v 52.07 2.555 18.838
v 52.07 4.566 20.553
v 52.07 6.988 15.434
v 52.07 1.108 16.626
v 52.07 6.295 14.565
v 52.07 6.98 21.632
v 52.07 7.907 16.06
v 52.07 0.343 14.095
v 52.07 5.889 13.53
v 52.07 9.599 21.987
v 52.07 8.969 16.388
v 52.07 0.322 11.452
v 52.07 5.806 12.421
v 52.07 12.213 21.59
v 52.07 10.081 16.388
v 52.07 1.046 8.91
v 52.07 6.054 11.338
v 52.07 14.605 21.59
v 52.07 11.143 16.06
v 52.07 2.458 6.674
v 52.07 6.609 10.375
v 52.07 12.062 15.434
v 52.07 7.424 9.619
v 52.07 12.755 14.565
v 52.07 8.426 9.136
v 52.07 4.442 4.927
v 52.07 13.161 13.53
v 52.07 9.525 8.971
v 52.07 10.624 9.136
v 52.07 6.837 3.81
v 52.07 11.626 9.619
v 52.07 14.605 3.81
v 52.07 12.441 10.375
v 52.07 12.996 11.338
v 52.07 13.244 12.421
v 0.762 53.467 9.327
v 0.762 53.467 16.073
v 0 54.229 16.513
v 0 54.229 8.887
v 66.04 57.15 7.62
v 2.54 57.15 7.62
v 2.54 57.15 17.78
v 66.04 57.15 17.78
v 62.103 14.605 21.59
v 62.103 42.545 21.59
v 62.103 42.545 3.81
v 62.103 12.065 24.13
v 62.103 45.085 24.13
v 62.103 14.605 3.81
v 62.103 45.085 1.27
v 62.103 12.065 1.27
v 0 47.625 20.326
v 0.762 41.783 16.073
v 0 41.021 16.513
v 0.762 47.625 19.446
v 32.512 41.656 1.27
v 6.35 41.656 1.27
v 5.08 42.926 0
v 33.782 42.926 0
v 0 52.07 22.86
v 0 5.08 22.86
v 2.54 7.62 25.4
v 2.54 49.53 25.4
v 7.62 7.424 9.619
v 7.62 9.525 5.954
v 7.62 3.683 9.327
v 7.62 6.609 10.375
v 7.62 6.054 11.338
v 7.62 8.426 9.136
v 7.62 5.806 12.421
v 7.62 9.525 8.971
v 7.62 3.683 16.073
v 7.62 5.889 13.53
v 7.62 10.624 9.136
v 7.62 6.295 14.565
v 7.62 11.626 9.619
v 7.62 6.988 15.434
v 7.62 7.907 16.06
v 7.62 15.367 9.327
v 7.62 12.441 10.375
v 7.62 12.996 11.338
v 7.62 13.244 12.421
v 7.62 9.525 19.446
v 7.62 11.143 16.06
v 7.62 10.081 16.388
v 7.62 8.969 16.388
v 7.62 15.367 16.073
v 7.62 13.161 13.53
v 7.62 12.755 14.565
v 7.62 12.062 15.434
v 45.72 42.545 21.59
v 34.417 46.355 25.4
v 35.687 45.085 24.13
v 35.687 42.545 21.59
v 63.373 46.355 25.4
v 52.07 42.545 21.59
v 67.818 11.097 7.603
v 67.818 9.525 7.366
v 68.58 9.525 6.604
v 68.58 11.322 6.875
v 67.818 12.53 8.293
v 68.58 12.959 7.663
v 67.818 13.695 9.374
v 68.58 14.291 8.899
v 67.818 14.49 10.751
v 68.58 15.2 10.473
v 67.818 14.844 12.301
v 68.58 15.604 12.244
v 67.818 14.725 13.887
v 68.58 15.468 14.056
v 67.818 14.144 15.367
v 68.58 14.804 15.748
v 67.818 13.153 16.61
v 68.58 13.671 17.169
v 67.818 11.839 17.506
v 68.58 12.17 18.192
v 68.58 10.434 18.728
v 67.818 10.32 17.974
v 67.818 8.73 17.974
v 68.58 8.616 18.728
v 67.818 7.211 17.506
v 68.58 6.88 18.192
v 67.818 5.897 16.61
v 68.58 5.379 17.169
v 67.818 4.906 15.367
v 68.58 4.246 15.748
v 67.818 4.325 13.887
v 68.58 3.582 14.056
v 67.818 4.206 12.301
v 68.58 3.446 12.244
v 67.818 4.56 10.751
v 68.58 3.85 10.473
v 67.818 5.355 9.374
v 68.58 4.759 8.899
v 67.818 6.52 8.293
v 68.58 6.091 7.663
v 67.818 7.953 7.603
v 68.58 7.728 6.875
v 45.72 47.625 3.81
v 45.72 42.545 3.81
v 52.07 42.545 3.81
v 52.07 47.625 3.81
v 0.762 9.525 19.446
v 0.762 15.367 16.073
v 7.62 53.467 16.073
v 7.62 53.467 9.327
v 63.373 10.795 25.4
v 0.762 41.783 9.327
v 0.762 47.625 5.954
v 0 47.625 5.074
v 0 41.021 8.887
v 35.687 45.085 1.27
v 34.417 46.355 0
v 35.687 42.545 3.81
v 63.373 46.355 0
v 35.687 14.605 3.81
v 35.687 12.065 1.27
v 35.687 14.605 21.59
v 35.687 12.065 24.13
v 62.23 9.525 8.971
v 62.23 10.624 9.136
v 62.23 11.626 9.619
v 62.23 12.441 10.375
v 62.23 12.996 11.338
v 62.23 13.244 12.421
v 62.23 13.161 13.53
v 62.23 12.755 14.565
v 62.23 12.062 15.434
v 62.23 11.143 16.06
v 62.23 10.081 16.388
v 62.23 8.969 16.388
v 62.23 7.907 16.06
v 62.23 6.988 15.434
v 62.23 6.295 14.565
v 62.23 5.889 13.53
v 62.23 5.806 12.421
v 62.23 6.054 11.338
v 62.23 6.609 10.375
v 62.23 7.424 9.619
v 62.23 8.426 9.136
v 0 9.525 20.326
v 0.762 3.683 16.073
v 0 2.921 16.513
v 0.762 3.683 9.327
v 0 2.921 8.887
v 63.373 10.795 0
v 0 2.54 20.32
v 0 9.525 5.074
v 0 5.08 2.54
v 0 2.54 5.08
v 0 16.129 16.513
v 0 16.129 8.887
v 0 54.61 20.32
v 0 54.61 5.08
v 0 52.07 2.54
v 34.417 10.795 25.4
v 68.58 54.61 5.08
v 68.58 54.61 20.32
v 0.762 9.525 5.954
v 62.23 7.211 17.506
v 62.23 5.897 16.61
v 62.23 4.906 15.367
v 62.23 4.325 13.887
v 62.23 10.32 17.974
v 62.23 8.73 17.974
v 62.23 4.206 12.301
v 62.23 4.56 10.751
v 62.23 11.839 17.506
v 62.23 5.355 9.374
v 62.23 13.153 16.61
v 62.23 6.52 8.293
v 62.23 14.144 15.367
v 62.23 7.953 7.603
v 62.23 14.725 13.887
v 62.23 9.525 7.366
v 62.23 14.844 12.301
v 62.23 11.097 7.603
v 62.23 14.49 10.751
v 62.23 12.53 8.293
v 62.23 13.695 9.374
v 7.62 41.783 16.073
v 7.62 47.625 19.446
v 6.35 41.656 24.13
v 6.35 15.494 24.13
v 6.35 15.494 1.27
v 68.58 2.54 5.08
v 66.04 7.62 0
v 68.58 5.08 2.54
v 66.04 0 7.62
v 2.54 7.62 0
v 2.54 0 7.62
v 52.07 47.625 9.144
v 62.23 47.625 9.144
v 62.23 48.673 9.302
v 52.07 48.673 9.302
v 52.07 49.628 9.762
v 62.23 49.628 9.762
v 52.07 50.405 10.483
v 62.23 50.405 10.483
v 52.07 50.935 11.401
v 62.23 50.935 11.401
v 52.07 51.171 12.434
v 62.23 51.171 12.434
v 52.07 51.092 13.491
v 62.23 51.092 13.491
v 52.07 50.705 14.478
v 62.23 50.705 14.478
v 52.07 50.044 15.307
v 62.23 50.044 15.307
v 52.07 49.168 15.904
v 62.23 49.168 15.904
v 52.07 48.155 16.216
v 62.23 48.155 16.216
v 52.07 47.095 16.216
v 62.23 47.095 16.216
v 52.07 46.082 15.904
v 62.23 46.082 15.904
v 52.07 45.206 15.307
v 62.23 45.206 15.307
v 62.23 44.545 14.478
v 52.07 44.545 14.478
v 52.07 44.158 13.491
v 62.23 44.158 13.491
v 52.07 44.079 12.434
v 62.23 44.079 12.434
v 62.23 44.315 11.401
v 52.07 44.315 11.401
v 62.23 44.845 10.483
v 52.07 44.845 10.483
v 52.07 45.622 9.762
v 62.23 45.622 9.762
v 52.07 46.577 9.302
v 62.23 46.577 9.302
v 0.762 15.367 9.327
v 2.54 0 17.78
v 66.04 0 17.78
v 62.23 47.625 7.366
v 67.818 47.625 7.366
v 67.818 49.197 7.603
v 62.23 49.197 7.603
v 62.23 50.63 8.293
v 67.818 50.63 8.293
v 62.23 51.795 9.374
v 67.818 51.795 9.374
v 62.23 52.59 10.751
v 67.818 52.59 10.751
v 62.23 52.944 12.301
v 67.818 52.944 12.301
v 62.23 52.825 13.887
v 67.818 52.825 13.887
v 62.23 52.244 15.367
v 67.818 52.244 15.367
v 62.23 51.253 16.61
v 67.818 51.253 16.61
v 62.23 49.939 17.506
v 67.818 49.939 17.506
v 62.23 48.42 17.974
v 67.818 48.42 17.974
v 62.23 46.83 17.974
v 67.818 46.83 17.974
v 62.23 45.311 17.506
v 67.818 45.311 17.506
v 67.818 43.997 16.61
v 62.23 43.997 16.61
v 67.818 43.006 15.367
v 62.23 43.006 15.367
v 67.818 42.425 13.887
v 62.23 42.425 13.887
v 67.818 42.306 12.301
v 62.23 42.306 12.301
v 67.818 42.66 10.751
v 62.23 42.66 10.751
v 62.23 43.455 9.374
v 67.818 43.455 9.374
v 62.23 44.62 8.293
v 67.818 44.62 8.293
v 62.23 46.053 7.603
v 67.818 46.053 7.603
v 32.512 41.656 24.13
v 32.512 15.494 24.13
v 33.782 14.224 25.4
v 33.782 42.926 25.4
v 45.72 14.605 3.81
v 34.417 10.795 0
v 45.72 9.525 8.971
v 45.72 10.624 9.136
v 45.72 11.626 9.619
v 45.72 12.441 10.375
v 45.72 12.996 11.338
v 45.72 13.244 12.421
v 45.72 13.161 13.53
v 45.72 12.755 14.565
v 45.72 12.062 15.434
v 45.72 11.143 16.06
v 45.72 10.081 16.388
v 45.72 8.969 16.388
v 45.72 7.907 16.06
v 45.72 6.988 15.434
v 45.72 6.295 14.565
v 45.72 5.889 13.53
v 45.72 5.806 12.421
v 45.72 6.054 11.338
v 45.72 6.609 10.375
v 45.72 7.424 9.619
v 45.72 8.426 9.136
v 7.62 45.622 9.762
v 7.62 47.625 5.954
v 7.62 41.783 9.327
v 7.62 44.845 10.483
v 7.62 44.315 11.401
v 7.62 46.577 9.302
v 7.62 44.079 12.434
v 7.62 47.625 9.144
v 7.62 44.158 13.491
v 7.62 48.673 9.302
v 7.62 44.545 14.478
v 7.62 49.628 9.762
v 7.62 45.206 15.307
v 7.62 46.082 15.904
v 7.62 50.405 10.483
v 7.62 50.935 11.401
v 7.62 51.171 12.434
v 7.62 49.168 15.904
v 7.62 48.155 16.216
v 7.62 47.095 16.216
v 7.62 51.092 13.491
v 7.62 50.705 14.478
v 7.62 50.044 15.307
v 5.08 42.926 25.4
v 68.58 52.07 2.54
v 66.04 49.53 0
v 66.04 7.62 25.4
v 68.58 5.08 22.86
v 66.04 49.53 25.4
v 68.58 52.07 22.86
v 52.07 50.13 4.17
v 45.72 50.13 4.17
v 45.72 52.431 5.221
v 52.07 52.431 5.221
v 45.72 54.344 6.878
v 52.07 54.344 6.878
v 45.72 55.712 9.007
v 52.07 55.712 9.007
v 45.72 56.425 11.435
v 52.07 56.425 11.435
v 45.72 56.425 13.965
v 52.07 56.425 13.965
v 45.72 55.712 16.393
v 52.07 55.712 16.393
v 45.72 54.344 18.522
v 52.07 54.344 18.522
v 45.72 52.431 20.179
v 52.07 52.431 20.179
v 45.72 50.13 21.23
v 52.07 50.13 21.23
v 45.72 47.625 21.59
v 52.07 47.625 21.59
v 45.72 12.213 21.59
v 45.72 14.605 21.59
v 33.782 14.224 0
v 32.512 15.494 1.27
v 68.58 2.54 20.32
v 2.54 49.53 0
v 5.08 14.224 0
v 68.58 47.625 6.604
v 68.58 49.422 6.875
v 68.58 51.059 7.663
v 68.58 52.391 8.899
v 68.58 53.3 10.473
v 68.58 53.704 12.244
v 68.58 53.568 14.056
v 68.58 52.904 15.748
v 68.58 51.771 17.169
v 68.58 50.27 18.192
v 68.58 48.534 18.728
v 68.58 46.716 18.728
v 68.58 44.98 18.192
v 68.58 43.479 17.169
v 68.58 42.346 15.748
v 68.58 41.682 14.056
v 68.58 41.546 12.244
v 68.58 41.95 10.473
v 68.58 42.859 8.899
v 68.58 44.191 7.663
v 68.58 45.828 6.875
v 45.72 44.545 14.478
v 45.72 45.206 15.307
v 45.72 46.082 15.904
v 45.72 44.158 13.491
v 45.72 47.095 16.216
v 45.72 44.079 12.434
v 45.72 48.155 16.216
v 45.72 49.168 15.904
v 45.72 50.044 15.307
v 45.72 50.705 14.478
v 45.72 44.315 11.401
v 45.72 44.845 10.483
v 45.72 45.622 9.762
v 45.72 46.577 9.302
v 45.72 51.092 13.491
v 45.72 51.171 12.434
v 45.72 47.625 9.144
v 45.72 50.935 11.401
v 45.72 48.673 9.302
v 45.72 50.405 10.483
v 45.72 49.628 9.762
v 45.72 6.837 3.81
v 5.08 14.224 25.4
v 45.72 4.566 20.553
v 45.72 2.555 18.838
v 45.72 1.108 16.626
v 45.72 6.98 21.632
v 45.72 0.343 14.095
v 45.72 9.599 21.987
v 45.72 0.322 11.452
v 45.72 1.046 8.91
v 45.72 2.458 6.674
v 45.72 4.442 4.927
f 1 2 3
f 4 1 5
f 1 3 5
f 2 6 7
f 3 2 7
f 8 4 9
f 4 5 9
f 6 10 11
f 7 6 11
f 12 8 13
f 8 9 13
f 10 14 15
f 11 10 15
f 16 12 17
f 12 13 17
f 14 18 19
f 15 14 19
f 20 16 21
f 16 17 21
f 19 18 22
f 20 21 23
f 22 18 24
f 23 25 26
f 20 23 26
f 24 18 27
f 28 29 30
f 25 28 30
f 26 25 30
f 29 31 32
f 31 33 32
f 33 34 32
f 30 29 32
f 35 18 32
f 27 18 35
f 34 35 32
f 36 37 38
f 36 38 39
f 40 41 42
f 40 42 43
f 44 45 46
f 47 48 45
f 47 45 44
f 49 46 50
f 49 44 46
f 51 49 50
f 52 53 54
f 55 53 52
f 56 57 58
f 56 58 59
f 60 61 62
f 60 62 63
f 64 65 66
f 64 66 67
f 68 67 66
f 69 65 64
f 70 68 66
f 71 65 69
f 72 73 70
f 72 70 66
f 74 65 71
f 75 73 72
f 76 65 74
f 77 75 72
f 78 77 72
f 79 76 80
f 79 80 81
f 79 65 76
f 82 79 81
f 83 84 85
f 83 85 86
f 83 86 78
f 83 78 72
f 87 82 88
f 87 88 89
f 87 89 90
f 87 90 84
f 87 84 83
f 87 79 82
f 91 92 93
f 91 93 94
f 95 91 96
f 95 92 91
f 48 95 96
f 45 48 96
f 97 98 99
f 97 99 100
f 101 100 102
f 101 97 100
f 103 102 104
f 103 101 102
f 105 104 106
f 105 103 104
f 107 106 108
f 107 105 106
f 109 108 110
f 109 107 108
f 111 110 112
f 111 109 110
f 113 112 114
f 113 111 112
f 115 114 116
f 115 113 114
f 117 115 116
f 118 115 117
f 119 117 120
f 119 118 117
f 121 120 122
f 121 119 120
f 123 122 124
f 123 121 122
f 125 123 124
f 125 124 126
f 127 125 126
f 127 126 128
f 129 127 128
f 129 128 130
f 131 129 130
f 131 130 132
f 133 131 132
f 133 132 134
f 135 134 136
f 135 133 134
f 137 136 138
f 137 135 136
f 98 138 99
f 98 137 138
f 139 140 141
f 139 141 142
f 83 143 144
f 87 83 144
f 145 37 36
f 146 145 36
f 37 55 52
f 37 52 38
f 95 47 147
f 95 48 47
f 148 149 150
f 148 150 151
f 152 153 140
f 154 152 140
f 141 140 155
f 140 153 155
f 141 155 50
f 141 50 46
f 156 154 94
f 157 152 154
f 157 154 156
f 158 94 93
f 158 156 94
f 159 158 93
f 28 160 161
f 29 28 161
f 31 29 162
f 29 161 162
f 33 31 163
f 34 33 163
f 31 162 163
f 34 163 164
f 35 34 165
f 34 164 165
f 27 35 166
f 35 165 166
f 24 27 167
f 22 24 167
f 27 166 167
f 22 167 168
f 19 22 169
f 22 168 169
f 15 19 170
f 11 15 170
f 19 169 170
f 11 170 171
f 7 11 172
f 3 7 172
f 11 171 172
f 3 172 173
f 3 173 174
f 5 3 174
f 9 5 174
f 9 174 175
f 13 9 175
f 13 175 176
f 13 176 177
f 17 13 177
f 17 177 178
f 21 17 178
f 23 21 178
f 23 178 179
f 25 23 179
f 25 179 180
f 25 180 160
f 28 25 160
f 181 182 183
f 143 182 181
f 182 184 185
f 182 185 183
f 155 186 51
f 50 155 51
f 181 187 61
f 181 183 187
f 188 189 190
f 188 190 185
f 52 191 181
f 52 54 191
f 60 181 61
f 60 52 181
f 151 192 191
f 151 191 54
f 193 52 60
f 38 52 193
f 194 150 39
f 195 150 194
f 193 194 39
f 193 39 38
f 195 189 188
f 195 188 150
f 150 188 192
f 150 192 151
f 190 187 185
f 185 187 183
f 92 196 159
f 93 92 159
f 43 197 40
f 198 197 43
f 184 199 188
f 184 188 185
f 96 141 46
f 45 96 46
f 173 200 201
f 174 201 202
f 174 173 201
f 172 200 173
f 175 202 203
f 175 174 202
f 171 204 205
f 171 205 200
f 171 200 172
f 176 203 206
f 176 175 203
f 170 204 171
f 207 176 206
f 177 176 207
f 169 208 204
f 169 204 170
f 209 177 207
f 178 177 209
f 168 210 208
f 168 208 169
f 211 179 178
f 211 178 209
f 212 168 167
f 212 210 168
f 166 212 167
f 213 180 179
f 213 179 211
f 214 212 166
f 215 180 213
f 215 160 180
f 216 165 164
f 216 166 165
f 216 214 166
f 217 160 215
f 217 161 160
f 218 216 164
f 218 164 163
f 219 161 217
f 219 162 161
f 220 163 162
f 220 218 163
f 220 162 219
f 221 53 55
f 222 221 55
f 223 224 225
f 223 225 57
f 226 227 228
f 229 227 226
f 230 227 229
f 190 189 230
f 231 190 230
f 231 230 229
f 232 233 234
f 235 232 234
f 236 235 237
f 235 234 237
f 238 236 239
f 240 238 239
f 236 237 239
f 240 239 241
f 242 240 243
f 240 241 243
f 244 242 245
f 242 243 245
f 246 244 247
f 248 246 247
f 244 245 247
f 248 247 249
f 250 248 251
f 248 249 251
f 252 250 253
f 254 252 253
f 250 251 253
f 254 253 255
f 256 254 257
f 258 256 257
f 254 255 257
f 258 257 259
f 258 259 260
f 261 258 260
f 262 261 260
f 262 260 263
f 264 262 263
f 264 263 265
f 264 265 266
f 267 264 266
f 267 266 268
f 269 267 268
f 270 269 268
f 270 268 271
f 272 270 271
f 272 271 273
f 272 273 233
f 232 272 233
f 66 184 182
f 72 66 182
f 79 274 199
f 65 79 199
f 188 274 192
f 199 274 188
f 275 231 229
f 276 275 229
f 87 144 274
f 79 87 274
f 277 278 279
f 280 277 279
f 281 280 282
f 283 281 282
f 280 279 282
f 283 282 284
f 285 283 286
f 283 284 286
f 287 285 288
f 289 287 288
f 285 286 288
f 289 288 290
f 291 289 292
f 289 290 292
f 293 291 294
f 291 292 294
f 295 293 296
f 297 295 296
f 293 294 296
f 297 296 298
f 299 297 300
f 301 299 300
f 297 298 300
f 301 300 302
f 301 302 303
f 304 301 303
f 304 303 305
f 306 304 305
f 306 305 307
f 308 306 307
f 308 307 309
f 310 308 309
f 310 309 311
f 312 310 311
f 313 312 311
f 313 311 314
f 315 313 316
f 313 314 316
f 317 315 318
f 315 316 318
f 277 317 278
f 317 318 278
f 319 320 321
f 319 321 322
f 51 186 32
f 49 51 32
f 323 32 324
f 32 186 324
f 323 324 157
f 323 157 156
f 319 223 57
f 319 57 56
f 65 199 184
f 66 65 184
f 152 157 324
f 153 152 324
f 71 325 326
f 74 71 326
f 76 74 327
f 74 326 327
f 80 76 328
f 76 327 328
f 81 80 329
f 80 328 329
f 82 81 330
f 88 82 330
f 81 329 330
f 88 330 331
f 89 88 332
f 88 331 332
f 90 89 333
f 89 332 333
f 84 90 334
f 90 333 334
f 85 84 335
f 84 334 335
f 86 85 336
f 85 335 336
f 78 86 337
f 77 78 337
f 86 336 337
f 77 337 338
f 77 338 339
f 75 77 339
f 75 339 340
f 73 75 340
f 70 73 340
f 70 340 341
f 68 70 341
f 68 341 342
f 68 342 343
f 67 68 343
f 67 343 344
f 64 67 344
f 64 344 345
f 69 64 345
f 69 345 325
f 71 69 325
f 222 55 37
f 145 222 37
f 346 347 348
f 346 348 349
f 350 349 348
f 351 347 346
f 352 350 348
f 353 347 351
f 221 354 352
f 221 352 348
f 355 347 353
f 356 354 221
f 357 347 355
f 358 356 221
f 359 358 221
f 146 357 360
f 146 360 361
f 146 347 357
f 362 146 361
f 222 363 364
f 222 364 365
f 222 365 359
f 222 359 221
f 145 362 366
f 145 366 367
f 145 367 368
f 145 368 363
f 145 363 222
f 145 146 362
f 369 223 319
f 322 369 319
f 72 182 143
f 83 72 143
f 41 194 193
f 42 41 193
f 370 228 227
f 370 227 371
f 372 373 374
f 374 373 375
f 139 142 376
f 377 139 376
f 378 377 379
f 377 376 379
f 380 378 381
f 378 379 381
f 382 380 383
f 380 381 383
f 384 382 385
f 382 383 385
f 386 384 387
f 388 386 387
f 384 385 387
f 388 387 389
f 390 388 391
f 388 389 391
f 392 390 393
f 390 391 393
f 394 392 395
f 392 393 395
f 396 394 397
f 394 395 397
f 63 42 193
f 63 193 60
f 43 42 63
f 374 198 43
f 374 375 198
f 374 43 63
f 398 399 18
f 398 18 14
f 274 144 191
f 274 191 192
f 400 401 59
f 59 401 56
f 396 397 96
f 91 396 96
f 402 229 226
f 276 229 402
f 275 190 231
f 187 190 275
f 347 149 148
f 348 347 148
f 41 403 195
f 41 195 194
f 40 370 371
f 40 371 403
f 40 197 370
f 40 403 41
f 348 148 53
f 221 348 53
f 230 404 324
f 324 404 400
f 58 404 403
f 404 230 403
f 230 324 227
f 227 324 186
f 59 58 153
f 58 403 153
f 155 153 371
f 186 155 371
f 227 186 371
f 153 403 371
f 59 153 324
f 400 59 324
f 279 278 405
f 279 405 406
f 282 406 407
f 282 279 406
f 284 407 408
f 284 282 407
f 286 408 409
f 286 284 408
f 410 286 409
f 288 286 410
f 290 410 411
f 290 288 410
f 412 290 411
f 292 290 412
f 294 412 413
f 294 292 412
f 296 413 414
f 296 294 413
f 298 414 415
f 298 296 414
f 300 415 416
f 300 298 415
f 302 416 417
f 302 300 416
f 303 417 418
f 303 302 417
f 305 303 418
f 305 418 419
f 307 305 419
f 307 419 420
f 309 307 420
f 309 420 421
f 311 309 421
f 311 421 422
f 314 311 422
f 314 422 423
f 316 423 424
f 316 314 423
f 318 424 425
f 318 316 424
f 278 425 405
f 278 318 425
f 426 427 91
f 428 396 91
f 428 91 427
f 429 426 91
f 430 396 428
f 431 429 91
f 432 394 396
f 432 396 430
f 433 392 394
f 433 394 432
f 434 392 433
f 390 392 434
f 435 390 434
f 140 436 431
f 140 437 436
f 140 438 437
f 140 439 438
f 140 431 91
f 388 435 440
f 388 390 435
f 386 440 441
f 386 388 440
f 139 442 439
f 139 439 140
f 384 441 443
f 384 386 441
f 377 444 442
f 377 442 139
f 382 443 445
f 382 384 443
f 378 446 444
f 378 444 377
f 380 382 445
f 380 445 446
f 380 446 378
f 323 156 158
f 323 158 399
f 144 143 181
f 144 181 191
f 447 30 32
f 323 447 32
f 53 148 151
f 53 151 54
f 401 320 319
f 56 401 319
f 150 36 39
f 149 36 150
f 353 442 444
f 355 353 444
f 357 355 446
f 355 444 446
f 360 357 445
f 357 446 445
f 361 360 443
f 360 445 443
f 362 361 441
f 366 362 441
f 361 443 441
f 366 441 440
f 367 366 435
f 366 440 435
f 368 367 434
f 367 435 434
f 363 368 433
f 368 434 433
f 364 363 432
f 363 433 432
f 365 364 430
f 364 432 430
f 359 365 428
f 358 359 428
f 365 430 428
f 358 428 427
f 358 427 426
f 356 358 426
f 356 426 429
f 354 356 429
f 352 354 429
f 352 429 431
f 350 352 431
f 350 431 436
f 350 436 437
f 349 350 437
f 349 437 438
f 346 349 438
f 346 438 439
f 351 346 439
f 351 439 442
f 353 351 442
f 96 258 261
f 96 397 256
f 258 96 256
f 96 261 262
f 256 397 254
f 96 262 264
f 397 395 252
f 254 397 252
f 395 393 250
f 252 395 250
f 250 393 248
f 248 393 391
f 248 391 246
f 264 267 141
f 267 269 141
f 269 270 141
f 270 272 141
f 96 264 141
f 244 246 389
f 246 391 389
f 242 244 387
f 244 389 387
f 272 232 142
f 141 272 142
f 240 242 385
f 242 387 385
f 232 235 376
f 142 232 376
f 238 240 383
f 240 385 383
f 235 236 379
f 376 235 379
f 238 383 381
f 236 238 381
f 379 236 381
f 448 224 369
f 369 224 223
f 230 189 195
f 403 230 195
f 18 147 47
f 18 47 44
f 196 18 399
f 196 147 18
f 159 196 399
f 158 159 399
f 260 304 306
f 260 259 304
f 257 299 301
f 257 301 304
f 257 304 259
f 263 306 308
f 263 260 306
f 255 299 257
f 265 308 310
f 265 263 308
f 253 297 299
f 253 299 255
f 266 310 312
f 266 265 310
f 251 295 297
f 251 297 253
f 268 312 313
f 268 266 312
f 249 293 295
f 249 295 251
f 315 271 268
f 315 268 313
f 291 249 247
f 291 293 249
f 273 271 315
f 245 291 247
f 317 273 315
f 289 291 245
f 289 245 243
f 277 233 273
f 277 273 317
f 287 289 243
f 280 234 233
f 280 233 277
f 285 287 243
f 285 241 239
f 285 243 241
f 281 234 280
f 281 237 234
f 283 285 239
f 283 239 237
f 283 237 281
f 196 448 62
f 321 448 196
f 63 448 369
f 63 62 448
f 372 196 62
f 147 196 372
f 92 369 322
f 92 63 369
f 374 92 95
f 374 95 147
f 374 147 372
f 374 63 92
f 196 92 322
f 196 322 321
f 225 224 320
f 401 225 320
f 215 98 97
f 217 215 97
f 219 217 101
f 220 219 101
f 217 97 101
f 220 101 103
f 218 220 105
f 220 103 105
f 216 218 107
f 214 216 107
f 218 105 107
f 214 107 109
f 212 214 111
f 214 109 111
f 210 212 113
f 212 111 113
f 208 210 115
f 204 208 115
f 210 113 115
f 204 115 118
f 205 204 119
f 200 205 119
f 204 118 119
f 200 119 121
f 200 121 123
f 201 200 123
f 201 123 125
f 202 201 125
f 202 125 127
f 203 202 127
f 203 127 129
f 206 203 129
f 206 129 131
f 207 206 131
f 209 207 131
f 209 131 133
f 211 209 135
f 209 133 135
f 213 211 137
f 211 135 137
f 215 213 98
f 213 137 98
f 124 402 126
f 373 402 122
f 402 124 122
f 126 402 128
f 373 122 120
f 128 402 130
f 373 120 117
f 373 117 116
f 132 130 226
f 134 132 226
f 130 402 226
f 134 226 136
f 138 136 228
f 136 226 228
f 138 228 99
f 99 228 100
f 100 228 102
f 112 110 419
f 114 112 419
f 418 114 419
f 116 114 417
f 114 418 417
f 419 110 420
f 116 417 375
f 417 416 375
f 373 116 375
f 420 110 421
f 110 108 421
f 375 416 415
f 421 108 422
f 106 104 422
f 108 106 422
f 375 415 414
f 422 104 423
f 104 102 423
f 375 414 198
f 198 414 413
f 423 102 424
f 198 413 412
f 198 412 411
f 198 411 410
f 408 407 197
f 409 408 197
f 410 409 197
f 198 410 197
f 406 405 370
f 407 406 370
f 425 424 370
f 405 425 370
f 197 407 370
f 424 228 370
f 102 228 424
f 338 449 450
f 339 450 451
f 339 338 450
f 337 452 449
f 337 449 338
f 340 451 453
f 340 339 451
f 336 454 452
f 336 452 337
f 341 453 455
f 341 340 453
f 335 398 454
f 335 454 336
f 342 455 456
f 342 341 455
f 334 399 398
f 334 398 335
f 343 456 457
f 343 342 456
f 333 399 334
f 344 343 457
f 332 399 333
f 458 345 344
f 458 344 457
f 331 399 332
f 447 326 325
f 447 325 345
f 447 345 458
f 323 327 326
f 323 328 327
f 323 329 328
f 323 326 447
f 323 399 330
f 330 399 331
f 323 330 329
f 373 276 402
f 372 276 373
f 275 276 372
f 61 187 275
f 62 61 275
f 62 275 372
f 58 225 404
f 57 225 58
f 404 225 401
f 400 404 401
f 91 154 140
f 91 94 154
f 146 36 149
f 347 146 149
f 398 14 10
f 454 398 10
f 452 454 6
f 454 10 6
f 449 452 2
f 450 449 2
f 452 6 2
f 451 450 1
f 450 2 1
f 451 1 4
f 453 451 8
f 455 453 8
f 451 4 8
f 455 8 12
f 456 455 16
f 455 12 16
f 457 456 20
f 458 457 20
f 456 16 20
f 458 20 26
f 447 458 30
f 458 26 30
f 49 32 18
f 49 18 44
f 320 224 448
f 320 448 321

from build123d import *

# Parameters (mm, degrees)
SKETCH1_W           = 68.58
SKETCH1_H           = 57.15
BOSS_EXTRUDE1_DEPTH = 25.4
SKETCH2_W           = 26.162
SKETCH2_H           = 26.162
SKETCH2_W_2         = 26.416
SKETCH2_H_2         = 27.94
CUT_EXTRUDE1_DEPTH  = 93.814324864
SKETCH5_R           = 3.556
SKETCH5_R_2         = 3.729278609
CUT_EXTRUDE2_DEPTH  = 93.814324864
CUT_EXTRUDE3_START  = -16.51
CUT_EXTRUDE3_DEPTH  = 6.35
CHAMFER1_SIZE       = 1.27
CHAMFER2_SIZE       = 2.54
CHAMFER3_SIZE       = 7.62
SKETCH7_R           = 5.334
CUT_EXTRUDE4_DEPTH  = 6.35
CUT_EXTRUDE5_DEPTH  = 7.62
CHAMFER4_SIZE       = 0.762
CHAMFER5_SIZE       = 3.81


with BuildPart() as part:
    # Sketch1 → Boss-Extrude1 (new body)
    with BuildSketch(Plane.XY):
        with Locations((34.29, 28.575)):
            Rectangle(SKETCH1_W, SKETCH1_H)
    extrude(amount=BOSS_EXTRUDE1_DEPTH)

    # Sketch2 → Cut-Extrude1 (cut, through all)
    with BuildSketch(Plane.XY.offset(25.4)):
        with Locations((19.431, 28.575)):
            Rectangle(SKETCH2_W, SKETCH2_H)
        with Locations((48.895, 28.575)):
            Rectangle(SKETCH2_W_2, SKETCH2_H_2)
    extrude(amount=-CUT_EXTRUDE1_DEPTH, mode=Mode.SUBTRACT)

    # Sketch5 → Cut-Extrude2 (cut, through all)
    with BuildSketch(Plane(origin=(68.58, 0, 0), x_dir=(0, 0, -1), z_dir=(1, 0, 0))):
        with Locations((-12.7, 47.625)):
            Circle(SKETCH5_R)
        with Locations((-12.7, 9.525)):
            Circle(SKETCH5_R_2)
    extrude(amount=-CUT_EXTRUDE2_DEPTH, mode=Mode.SUBTRACT)

    # Sketch6 → Cut-Extrude3 (cut)
    with BuildSketch(Plane(origin=(68.58, 0, 0), x_dir=(0, 0, -1), z_dir=(1, 0, 0)).offset(CUT_EXTRUDE3_START)):
        with BuildLine():
            Line((-21.59, 47.625), (-21.59, 12.21272508))
            ThreePointArc((-21.59, 12.21272508), (-15.38772508, 0.635), (-3.81, 6.83727492))
            Line((-3.81, 6.83727492), (-3.81, 47.625))
            ThreePointArc((-3.81, 47.625), (-12.7, 56.515), (-21.59, 47.625))
        make_face()
    extrude(amount=-CUT_EXTRUDE3_DEPTH, mode=Mode.SUBTRACT)

    # Chamfer1
    chamfer1_edges = [part.edges().sort_by_distance(p)[0] for p in [
        (6.35, 28.575, 0),
        (19.431, 41.656, 0),
        (32.512, 28.575, 0),
        (19.431, 15.494, 0),
        (6.35, 28.575, 25.4),
        (19.431, 15.494, 25.4),
        (32.512, 28.575, 25.4),
        (19.431, 41.656, 25.4),
        (35.687, 28.575, 0),
        (62.103, 28.575, 0),
        (35.687, 28.575, 25.4),
        (62.103, 28.575, 25.4),
    ]]
    chamfer(chamfer1_edges, length=CHAMFER1_SIZE)

    # Chamfer2
    chamfer2_edges = [part.edges().sort_by_distance(p)[0] for p in [
        (68.58, 28.575, 25.4),
        (0, 28.575, 25.4),
        (68.58, 28.575, 0),
        (0, 28.575, 0),
        (0, 57.15, 12.7),
        (68.58, 57.15, 12.7),
        (68.58, 0, 12.7),
        (0, 0, 12.7),
    ]]
    chamfer(chamfer2_edges, length=CHAMFER2_SIZE)

    # Chamfer3
    # the kernel refuses this chamfer: 7.62 mm, written as the material it takes off along each edge
    with BuildSketch(Plane(origin=(-17.056224368, 0, 0), x_dir=(0, 1, 0), z_dir=(1, 0, 0)), Plane(origin=(-17.056224368, 0, 25.4), x_dir=(0, 0, -1), z_dir=(1, 0, 0)), Plane(origin=(85.636224368, 57.15, 0), x_dir=(0, -1, 0), z_dir=(-1, 0, 0)), Plane(origin=(85.636224368, 57.15, 25.4), x_dir=(0, 0, -1), z_dir=(-1, 0, 0))) as chamfer3_piece_1:
        Polygon((CHAMFER3_SIZE, 0), (0, CHAMFER3_SIZE), (0, 0), align=None)
    extrude(amount=102.692448737, mode=Mode.SUBTRACT)

    # Sketch7 → Cut-Extrude4 (cut)
    with BuildSketch(Plane(origin=(68.58, 0, 0), x_dir=(0, 0, -1), z_dir=(1, 0, 0))):
        with Locations((-12.7, 47.625)):
            Circle(SKETCH7_R)
        with Locations((-12.7, 9.525)):
            Circle(SKETCH7_R)
    extrude(amount=-CUT_EXTRUDE4_DEPTH, mode=Mode.SUBTRACT)

    # Sketch9 → Cut-Extrude5 (cut)
    with BuildSketch(Plane.ZY):
        Polygon((16.072880273, 53.467), (9.327119727, 53.467), (5.954239455, 47.625), (9.327119727, 41.783), (16.072880273, 41.783), (19.445760545, 47.625), align=None)
        Polygon((16.072880273, 15.367), (9.327119727, 15.367), (5.954239455, 9.525), (9.327119727, 3.683), (16.072880273, 3.683), (19.445760545, 9.525), align=None)
    extrude(amount=-CUT_EXTRUDE5_DEPTH, mode=Mode.SUBTRACT)

    # Chamfer4
    chamfer4_edges = [part.edges().sort_by_distance(p)[0] for p in [
        (68.58, 47.625, 18.034),
        (68.58, 9.525, 18.034),
        (0, 50.546, 17.759320409),
        (0, 53.467, 12.7),
        (0, 50.546, 7.640679591),
        (0, 44.704, 7.640679591),
        (0, 41.783, 12.7),
        (0, 44.704, 17.759320409),
        (0, 12.446, 17.759320409),
        (0, 15.367, 12.7),
        (0, 12.446, 7.640679591),
        (0, 6.604, 7.640679591),
        (0, 3.683, 12.7),
        (0, 6.604, 17.759320409),
    ]]
    chamfer(chamfer4_edges, length=CHAMFER4_SIZE)

    # Chamfer5
    # the kernel refuses this chamfer: 3.81 mm, written as the material it takes off along each edge
    with BuildSketch(Plane(origin=(24.618887816, 14.605, 0), x_dir=(0, -1, 0), z_dir=(1, 0, 0))) as chamfer5_piece_1_section:
        Polygon((CHAMFER5_SIZE, 0), (0, -CHAMFER5_SIZE), (0, 0), align=None)
    chamfer5_piece_1 = extrude(amount=48.552224368, mode=Mode.PRIVATE)
    chamfer5_piece_1 = split(chamfer5_piece_1, bisect_by=Plane(origin=(29.517943908, 14.605, -4.899056092), z_dir=(-0.7071067811865467, 0, 0.7071067811865483)), keep=Keep.TOP, mode=Mode.PRIVATE)
    chamfer5_piece_1 = split(chamfer5_piece_1, bisect_by=Plane(origin=(35.687, 14.605, 0), z_dir=(1, 0, 0)), keep=Keep.TOP, mode=Mode.PRIVATE)
    add(chamfer5_piece_1, mode=Mode.SUBTRACT)
    with BuildSketch(Plane(origin=(24.618887816, 14.605, 0), x_dir=(0, -1, 0), z_dir=(1, 0, 0))) as chamfer5_piece_2_section:
        Polygon((CHAMFER5_SIZE, 0), (0, -CHAMFER5_SIZE), (0, 0), align=None)
    chamfer5_piece_2 = extrude(amount=48.552224368, mode=Mode.PRIVATE)
    chamfer5_piece_2 = split(chamfer5_piece_2, bisect_by=Plane(origin=(29.517943908, 14.605, -4.899056092), z_dir=(0.7071067811865467, 0, -0.7071067811865483)), keep=Keep.TOP, mode=Mode.PRIVATE)
    chamfer5_piece_2 = split(chamfer5_piece_2, bisect_by=Plane(origin=(35.687, 14.605, 0), z_dir=(-1, 0, 0)), keep=Keep.TOP, mode=Mode.PRIVATE)
    add(chamfer5_piece_2, mode=Mode.SUBTRACT)
    with BuildSketch(Plane(origin=(24.618887816, 14.605, 0), x_dir=(0, -1, 0), z_dir=(1, 0, 0))) as chamfer5_piece_3_section:
        Polygon((CHAMFER5_SIZE, 0), (0, -CHAMFER5_SIZE), (0, 0), align=None)
    chamfer5_piece_3 = extrude(amount=48.552224368, mode=Mode.PRIVATE)
    chamfer5_piece_3 = split(chamfer5_piece_3, bisect_by=Plane(origin=(62.103, 14.605, 0), z_dir=(-1, 0, 0)), keep=Keep.TOP, mode=Mode.PRIVATE)
    chamfer5_piece_3 = split(chamfer5_piece_3, bisect_by=Plane(origin=(43.995943908, 14.605, 19.377056092), z_dir=(-0.7071067811865467, 0, -0.7071067811865483)), keep=Keep.TOP, mode=Mode.PRIVATE)
    chamfer5_piece_3 = split(chamfer5_piece_3, bisect_by=Plane(origin=(29.517943908, 14.605, -4.899056092), z_dir=(0.7071067811865467, 0, -0.7071067811865483)), keep=Keep.TOP, mode=Mode.PRIVATE)
    chamfer5_piece_3 = split(chamfer5_piece_3, bisect_by=Plane(origin=(35.687, 14.605, 0), z_dir=(1, 0, 0)), keep=Keep.TOP, mode=Mode.PRIVATE)
    add(chamfer5_piece_3, mode=Mode.SUBTRACT)
    with BuildSketch(Plane(origin=(24.618887816, 14.605, 0), x_dir=(0, -1, 0), z_dir=(1, 0, 0))) as chamfer5_piece_4_section:
        Polygon((CHAMFER5_SIZE, 0), (0, -CHAMFER5_SIZE), (0, 0), align=None)
    chamfer5_piece_4 = extrude(amount=48.552224368, mode=Mode.PRIVATE)
    chamfer5_piece_4 = split(chamfer5_piece_4, bisect_by=Plane(origin=(62.103, 14.605, 0), z_dir=(-1, 0, 0)), keep=Keep.TOP, mode=Mode.PRIVATE)
    chamfer5_piece_4 = split(chamfer5_piece_4, bisect_by=Plane(origin=(43.995943908, 14.605, 19.377056092), z_dir=(0.7071067811865467, 0, 0.7071067811865483)), keep=Keep.TOP, mode=Mode.PRIVATE)
    add(chamfer5_piece_4, mode=Mode.SUBTRACT)
    with BuildSketch(Plane(origin=(24.618887816, 14.605, 0), x_dir=(0, -1, 0), z_dir=(1, 0, 0))) as chamfer5_piece_5_section:
        Polygon((CHAMFER5_SIZE, 0), (0, -CHAMFER5_SIZE), (0, 0), align=None)
    chamfer5_piece_5 = extrude(amount=48.552224368, mode=Mode.PRIVATE)
    chamfer5_piece_5 = split(chamfer5_piece_5, bisect_by=Plane(origin=(62.103, 14.605, 0), z_dir=(1, 0, 0)), keep=Keep.TOP, mode=Mode.PRIVATE)
    chamfer5_piece_5 = split(chamfer5_piece_5, bisect_by=Plane(origin=(43.995943908, 14.605, 19.377056092), z_dir=(-0.7071067811865467, 0, -0.7071067811865483)), keep=Keep.TOP, mode=Mode.PRIVATE)
    add(chamfer5_piece_5, mode=Mode.SUBTRACT)
    with BuildSketch(Plane(origin=(73.171112184, 42.545, 0), x_dir=(0, 1, 0), z_dir=(-1, 0, 0))) as chamfer5_piece_6_section:
        Polygon((CHAMFER5_SIZE, 0), (0, -CHAMFER5_SIZE), (0, 0), align=None)
    chamfer5_piece_6 = extrude(amount=48.552224368, mode=Mode.PRIVATE)
    chamfer5_piece_6 = split(chamfer5_piece_6, bisect_by=Plane(origin=(68.272056092, 42.545, -4.899056092), z_dir=(0.7071067811865467, 0, 0.7071067811865483)), keep=Keep.TOP, mode=Mode.PRIVATE)
    chamfer5_piece_6 = split(chamfer5_piece_6, bisect_by=Plane(origin=(62.103, 42.545, 0), z_dir=(-1, 0, 0)), keep=Keep.TOP, mode=Mode.PRIVATE)
    add(chamfer5_piece_6, mode=Mode.SUBTRACT)
    with BuildSketch(Plane(origin=(73.171112184, 42.545, 0), x_dir=(0, 1, 0), z_dir=(-1, 0, 0))) as chamfer5_piece_7_section:
        Polygon((CHAMFER5_SIZE, 0), (0, -CHAMFER5_SIZE), (0, 0), align=None)
    chamfer5_piece_7 = extrude(amount=48.552224368, mode=Mode.PRIVATE)
    chamfer5_piece_7 = split(chamfer5_piece_7, bisect_by=Plane(origin=(68.272056092, 42.545, -4.899056092), z_dir=(-0.7071067811865467, 0, -0.7071067811865483)), keep=Keep.TOP, mode=Mode.PRIVATE)
    chamfer5_piece_7 = split(chamfer5_piece_7, bisect_by=Plane(origin=(62.103, 42.545, 0), z_dir=(1, 0, 0)), keep=Keep.TOP, mode=Mode.PRIVATE)
    add(chamfer5_piece_7, mode=Mode.SUBTRACT)
    with BuildSketch(Plane(origin=(73.171112184, 42.545, 0), x_dir=(0, 1, 0), z_dir=(-1, 0, 0))) as chamfer5_piece_8_section:
        Polygon((CHAMFER5_SIZE, 0), (0, -CHAMFER5_SIZE), (0, 0), align=None)
    chamfer5_piece_8 = extrude(amount=48.552224368, mode=Mode.PRIVATE)
    chamfer5_piece_8 = split(chamfer5_piece_8, bisect_by=Plane(origin=(35.687, 42.545, 0), z_dir=(1, 0, 0)), keep=Keep.TOP, mode=Mode.PRIVATE)
    chamfer5_piece_8 = split(chamfer5_piece_8, bisect_by=Plane(origin=(53.794056092, 42.545, 19.377056092), z_dir=(0.7071067811865467, 0, -0.7071067811865483)), keep=Keep.TOP, mode=Mode.PRIVATE)
    chamfer5_piece_8 = split(chamfer5_piece_8, bisect_by=Plane(origin=(68.272056092, 42.545, -4.899056092), z_dir=(-0.7071067811865467, 0, -0.7071067811865483)), keep=Keep.TOP, mode=Mode.PRIVATE)
    chamfer5_piece_8 = split(chamfer5_piece_8, bisect_by=Plane(origin=(62.103, 42.545, 0), z_dir=(-1, 0, 0)), keep=Keep.TOP, mode=Mode.PRIVATE)
    add(chamfer5_piece_8, mode=Mode.SUBTRACT)
    with BuildSketch(Plane(origin=(73.171112184, 42.545, 0), x_dir=(0, 1, 0), z_dir=(-1, 0, 0))) as chamfer5_piece_9_section:
        Polygon((CHAMFER5_SIZE, 0), (0, -CHAMFER5_SIZE), (0, 0), align=None)
    chamfer5_piece_9 = extrude(amount=48.552224368, mode=Mode.PRIVATE)
    chamfer5_piece_9 = split(chamfer5_piece_9, bisect_by=Plane(origin=(35.687, 42.545, 0), z_dir=(1, 0, 0)), keep=Keep.TOP, mode=Mode.PRIVATE)
    chamfer5_piece_9 = split(chamfer5_piece_9, bisect_by=Plane(origin=(53.794056092, 42.545, 19.377056092), z_dir=(-0.7071067811865467, 0, 0.7071067811865483)), keep=Keep.TOP, mode=Mode.PRIVATE)
    add(chamfer5_piece_9, mode=Mode.SUBTRACT)
    with BuildSketch(Plane(origin=(73.171112184, 42.545, 0), x_dir=(0, 1, 0), z_dir=(-1, 0, 0))) as chamfer5_piece_10_section:
        Polygon((CHAMFER5_SIZE, 0), (0, -CHAMFER5_SIZE), (0, 0), align=None)
    chamfer5_piece_10 = extrude(amount=48.552224368, mode=Mode.PRIVATE)
    chamfer5_piece_10 = split(chamfer5_piece_10, bisect_by=Plane(origin=(35.687, 42.545, 0), z_dir=(-1, 0, 0)), keep=Keep.TOP, mode=Mode.PRIVATE)
    chamfer5_piece_10 = split(chamfer5_piece_10, bisect_by=Plane(origin=(53.794056092, 42.545, 19.377056092), z_dir=(0.7071067811865467, 0, -0.7071067811865483)), keep=Keep.TOP, mode=Mode.PRIVATE)
    add(chamfer5_piece_10, mode=Mode.SUBTRACT)
    with BuildSketch(Plane(origin=(73.171112184, 42.545, 25.4), x_dir=(0, 1, 0), z_dir=(-1, 0, 0))) as chamfer5_piece_11_section:
        Polygon((CHAMFER5_SIZE, 0), (0, CHAMFER5_SIZE), (0, 0), align=None)
    chamfer5_piece_11 = extrude(amount=48.552224368, mode=Mode.PRIVATE)
    chamfer5_piece_11 = split(chamfer5_piece_11, bisect_by=Plane(origin=(68.272056092, 42.545, 30.299056092), z_dir=(0.7071067811865465, 0, -0.7071067811865486)), keep=Keep.TOP, mode=Mode.PRIVATE)
    chamfer5_piece_11 = split(chamfer5_piece_11, bisect_by=Plane(origin=(62.103, 42.545, 25.4), z_dir=(-1, 0, 0)), keep=Keep.TOP, mode=Mode.PRIVATE)
    add(chamfer5_piece_11, mode=Mode.SUBTRACT)
    with BuildSketch(Plane(origin=(73.171112184, 42.545, 25.4), x_dir=(0, 1, 0), z_dir=(-1, 0, 0))) as chamfer5_piece_12_section:
        Polygon((CHAMFER5_SIZE, 0), (0, CHAMFER5_SIZE), (0, 0), align=None)
    chamfer5_piece_12 = extrude(amount=48.552224368, mode=Mode.PRIVATE)
    chamfer5_piece_12 = split(chamfer5_piece_12, bisect_by=Plane(origin=(68.272056092, 42.545, 30.299056092), z_dir=(-0.7071067811865465, 0, 0.7071067811865486)), keep=Keep.TOP, mode=Mode.PRIVATE)
    chamfer5_piece_12 = split(chamfer5_piece_12, bisect_by=Plane(origin=(62.103, 42.545, 25.4), z_dir=(1, 0, 0)), keep=Keep.TOP, mode=Mode.PRIVATE)
    add(chamfer5_piece_12, mode=Mode.SUBTRACT)
    with BuildSketch(Plane(origin=(73.171112184, 42.545, 25.4), x_dir=(0, 1, 0), z_dir=(-1, 0, 0))) as chamfer5_piece_13_section:
        Polygon((CHAMFER5_SIZE, 0), (0, CHAMFER5_SIZE), (0, 0), align=None)
    chamfer5_piece_13 = extrude(amount=48.552224368, mode=Mode.PRIVATE)
    chamfer5_piece_13 = split(chamfer5_piece_13, bisect_by=Plane(origin=(53.794056092, 42.545, 6.022943908), z_dir=(0.7071067811865465, 0, 0.7071067811865486)), keep=Keep.TOP, mode=Mode.PRIVATE)
    chamfer5_piece_13 = split(chamfer5_piece_13, bisect_by=Plane(origin=(68.272056092, 42.545, 30.299056092), z_dir=(-0.7071067811865465, 0, 0.7071067811865486)), keep=Keep.TOP, mode=Mode.PRIVATE)
    chamfer5_piece_13 = split(chamfer5_piece_13, bisect_by=Plane(origin=(35.687, 42.545, 25.4), z_dir=(1, 0, 0)), keep=Keep.TOP, mode=Mode.PRIVATE)
    chamfer5_piece_13 = split(chamfer5_piece_13, bisect_by=Plane(origin=(62.103, 42.545, 25.4), z_dir=(-1, 0, 0)), keep=Keep.TOP, mode=Mode.PRIVATE)
    add(chamfer5_piece_13, mode=Mode.SUBTRACT)
    with BuildSketch(Plane(origin=(73.171112184, 42.545, 25.4), x_dir=(0, 1, 0), z_dir=(-1, 0, 0))) as chamfer5_piece_14_section:
        Polygon((CHAMFER5_SIZE, 0), (0, CHAMFER5_SIZE), (0, 0), align=None)
    chamfer5_piece_14 = extrude(amount=48.552224368, mode=Mode.PRIVATE)
    chamfer5_piece_14 = split(chamfer5_piece_14, bisect_by=Plane(origin=(53.794056092, 42.545, 6.022943908), z_dir=(-0.7071067811865465, 0, -0.7071067811865486)), keep=Keep.TOP, mode=Mode.PRIVATE)
    chamfer5_piece_14 = split(chamfer5_piece_14, bisect_by=Plane(origin=(35.687, 42.545, 25.4), z_dir=(1, 0, 0)), keep=Keep.TOP, mode=Mode.PRIVATE)
    add(chamfer5_piece_14, mode=Mode.SUBTRACT)
    with BuildSketch(Plane(origin=(73.171112184, 42.545, 25.4), x_dir=(0, 1, 0), z_dir=(-1, 0, 0))) as chamfer5_piece_15_section:
        Polygon((CHAMFER5_SIZE, 0), (0, CHAMFER5_SIZE), (0, 0), align=None)
    chamfer5_piece_15 = extrude(amount=48.552224368, mode=Mode.PRIVATE)
    chamfer5_piece_15 = split(chamfer5_piece_15, bisect_by=Plane(origin=(53.794056092, 42.545, 6.022943908), z_dir=(0.7071067811865465, 0, 0.7071067811865486)), keep=Keep.TOP, mode=Mode.PRIVATE)
    chamfer5_piece_15 = split(chamfer5_piece_15, bisect_by=Plane(origin=(35.687, 42.545, 25.4), z_dir=(-1, 0, 0)), keep=Keep.TOP, mode=Mode.PRIVATE)
    add(chamfer5_piece_15, mode=Mode.SUBTRACT)
    with BuildSketch(Plane(origin=(24.618887816, 14.605, 25.4), x_dir=(0, -1, 0), z_dir=(1, 0, 0))) as chamfer5_piece_16_section:
        Polygon((CHAMFER5_SIZE, 0), (0, CHAMFER5_SIZE), (0, 0), align=None)
    chamfer5_piece_16 = extrude(amount=48.552224368, mode=Mode.PRIVATE)
    chamfer5_piece_16 = split(chamfer5_piece_16, bisect_by=Plane(origin=(35.687, 14.605, 25.4), z_dir=(1, 0, 0)), keep=Keep.TOP, mode=Mode.PRIVATE)
    chamfer5_piece_16 = split(chamfer5_piece_16, bisect_by=Plane(origin=(29.517943908, 14.605, 30.299056092), z_dir=(-0.7071067811865465, 0, -0.7071067811865486)), keep=Keep.TOP, mode=Mode.PRIVATE)
    add(chamfer5_piece_16, mode=Mode.SUBTRACT)
    with BuildSketch(Plane(origin=(24.618887816, 14.605, 25.4), x_dir=(0, -1, 0), z_dir=(1, 0, 0))) as chamfer5_piece_17_section:
        Polygon((CHAMFER5_SIZE, 0), (0, CHAMFER5_SIZE), (0, 0), align=None)
    chamfer5_piece_17 = extrude(amount=48.552224368, mode=Mode.PRIVATE)
    chamfer5_piece_17 = split(chamfer5_piece_17, bisect_by=Plane(origin=(35.687, 14.605, 25.4), z_dir=(-1, 0, 0)), keep=Keep.TOP, mode=Mode.PRIVATE)
    chamfer5_piece_17 = split(chamfer5_piece_17, bisect_by=Plane(origin=(29.517943908, 14.605, 30.299056092), z_dir=(0.7071067811865465, 0, 0.7071067811865486)), keep=Keep.TOP, mode=Mode.PRIVATE)
    add(chamfer5_piece_17, mode=Mode.SUBTRACT)
    with BuildSketch(Plane(origin=(24.618887816, 14.605, 25.4), x_dir=(0, -1, 0), z_dir=(1, 0, 0))) as chamfer5_piece_18_section:
        Polygon((CHAMFER5_SIZE, 0), (0, CHAMFER5_SIZE), (0, 0), align=None)
    chamfer5_piece_18 = extrude(amount=48.552224368, mode=Mode.PRIVATE)
    chamfer5_piece_18 = split(chamfer5_piece_18, bisect_by=Plane(origin=(62.103, 14.605, 25.4), z_dir=(-1, 0, 0)), keep=Keep.TOP, mode=Mode.PRIVATE)
    chamfer5_piece_18 = split(chamfer5_piece_18, bisect_by=Plane(origin=(35.687, 14.605, 25.4), z_dir=(1, 0, 0)), keep=Keep.TOP, mode=Mode.PRIVATE)
    chamfer5_piece_18 = split(chamfer5_piece_18, bisect_by=Plane(origin=(29.517943908, 14.605, 30.299056092), z_dir=(0.7071067811865465, 0, 0.7071067811865486)), keep=Keep.TOP, mode=Mode.PRIVATE)
    chamfer5_piece_18 = split(chamfer5_piece_18, bisect_by=Plane(origin=(43.995943908, 14.605, 6.022943908), z_dir=(-0.7071067811865465, 0, 0.7071067811865486)), keep=Keep.TOP, mode=Mode.PRIVATE)
    add(chamfer5_piece_18, mode=Mode.SUBTRACT)
    with BuildSketch(Plane(origin=(24.618887816, 14.605, 25.4), x_dir=(0, -1, 0), z_dir=(1, 0, 0))) as chamfer5_piece_19_section:
        Polygon((CHAMFER5_SIZE, 0), (0, CHAMFER5_SIZE), (0, 0), align=None)
    chamfer5_piece_19 = extrude(amount=48.552224368, mode=Mode.PRIVATE)
    chamfer5_piece_19 = split(chamfer5_piece_19, bisect_by=Plane(origin=(62.103, 14.605, 25.4), z_dir=(-1, 0, 0)), keep=Keep.TOP, mode=Mode.PRIVATE)
    chamfer5_piece_19 = split(chamfer5_piece_19, bisect_by=Plane(origin=(43.995943908, 14.605, 6.022943908), z_dir=(0.7071067811865465, 0, -0.7071067811865486)), keep=Keep.TOP, mode=Mode.PRIVATE)
    add(chamfer5_piece_19, mode=Mode.SUBTRACT)
    with BuildSketch(Plane(origin=(24.618887816, 14.605, 25.4), x_dir=(0, -1, 0), z_dir=(1, 0, 0))) as chamfer5_piece_20_section:
        Polygon((CHAMFER5_SIZE, 0), (0, CHAMFER5_SIZE), (0, 0), align=None)
    chamfer5_piece_20 = extrude(amount=48.552224368, mode=Mode.PRIVATE)
    chamfer5_piece_20 = split(chamfer5_piece_20, bisect_by=Plane(origin=(62.103, 14.605, 25.4), z_dir=(1, 0, 0)), keep=Keep.TOP, mode=Mode.PRIVATE)
    chamfer5_piece_20 = split(chamfer5_piece_20, bisect_by=Plane(origin=(43.995943908, 14.605, 6.022943908), z_dir=(-0.7071067811865465, 0, 0.7071067811865486)), keep=Keep.TOP, mode=Mode.PRIVATE)
    add(chamfer5_piece_20, mode=Mode.SUBTRACT)


solid = part.part
